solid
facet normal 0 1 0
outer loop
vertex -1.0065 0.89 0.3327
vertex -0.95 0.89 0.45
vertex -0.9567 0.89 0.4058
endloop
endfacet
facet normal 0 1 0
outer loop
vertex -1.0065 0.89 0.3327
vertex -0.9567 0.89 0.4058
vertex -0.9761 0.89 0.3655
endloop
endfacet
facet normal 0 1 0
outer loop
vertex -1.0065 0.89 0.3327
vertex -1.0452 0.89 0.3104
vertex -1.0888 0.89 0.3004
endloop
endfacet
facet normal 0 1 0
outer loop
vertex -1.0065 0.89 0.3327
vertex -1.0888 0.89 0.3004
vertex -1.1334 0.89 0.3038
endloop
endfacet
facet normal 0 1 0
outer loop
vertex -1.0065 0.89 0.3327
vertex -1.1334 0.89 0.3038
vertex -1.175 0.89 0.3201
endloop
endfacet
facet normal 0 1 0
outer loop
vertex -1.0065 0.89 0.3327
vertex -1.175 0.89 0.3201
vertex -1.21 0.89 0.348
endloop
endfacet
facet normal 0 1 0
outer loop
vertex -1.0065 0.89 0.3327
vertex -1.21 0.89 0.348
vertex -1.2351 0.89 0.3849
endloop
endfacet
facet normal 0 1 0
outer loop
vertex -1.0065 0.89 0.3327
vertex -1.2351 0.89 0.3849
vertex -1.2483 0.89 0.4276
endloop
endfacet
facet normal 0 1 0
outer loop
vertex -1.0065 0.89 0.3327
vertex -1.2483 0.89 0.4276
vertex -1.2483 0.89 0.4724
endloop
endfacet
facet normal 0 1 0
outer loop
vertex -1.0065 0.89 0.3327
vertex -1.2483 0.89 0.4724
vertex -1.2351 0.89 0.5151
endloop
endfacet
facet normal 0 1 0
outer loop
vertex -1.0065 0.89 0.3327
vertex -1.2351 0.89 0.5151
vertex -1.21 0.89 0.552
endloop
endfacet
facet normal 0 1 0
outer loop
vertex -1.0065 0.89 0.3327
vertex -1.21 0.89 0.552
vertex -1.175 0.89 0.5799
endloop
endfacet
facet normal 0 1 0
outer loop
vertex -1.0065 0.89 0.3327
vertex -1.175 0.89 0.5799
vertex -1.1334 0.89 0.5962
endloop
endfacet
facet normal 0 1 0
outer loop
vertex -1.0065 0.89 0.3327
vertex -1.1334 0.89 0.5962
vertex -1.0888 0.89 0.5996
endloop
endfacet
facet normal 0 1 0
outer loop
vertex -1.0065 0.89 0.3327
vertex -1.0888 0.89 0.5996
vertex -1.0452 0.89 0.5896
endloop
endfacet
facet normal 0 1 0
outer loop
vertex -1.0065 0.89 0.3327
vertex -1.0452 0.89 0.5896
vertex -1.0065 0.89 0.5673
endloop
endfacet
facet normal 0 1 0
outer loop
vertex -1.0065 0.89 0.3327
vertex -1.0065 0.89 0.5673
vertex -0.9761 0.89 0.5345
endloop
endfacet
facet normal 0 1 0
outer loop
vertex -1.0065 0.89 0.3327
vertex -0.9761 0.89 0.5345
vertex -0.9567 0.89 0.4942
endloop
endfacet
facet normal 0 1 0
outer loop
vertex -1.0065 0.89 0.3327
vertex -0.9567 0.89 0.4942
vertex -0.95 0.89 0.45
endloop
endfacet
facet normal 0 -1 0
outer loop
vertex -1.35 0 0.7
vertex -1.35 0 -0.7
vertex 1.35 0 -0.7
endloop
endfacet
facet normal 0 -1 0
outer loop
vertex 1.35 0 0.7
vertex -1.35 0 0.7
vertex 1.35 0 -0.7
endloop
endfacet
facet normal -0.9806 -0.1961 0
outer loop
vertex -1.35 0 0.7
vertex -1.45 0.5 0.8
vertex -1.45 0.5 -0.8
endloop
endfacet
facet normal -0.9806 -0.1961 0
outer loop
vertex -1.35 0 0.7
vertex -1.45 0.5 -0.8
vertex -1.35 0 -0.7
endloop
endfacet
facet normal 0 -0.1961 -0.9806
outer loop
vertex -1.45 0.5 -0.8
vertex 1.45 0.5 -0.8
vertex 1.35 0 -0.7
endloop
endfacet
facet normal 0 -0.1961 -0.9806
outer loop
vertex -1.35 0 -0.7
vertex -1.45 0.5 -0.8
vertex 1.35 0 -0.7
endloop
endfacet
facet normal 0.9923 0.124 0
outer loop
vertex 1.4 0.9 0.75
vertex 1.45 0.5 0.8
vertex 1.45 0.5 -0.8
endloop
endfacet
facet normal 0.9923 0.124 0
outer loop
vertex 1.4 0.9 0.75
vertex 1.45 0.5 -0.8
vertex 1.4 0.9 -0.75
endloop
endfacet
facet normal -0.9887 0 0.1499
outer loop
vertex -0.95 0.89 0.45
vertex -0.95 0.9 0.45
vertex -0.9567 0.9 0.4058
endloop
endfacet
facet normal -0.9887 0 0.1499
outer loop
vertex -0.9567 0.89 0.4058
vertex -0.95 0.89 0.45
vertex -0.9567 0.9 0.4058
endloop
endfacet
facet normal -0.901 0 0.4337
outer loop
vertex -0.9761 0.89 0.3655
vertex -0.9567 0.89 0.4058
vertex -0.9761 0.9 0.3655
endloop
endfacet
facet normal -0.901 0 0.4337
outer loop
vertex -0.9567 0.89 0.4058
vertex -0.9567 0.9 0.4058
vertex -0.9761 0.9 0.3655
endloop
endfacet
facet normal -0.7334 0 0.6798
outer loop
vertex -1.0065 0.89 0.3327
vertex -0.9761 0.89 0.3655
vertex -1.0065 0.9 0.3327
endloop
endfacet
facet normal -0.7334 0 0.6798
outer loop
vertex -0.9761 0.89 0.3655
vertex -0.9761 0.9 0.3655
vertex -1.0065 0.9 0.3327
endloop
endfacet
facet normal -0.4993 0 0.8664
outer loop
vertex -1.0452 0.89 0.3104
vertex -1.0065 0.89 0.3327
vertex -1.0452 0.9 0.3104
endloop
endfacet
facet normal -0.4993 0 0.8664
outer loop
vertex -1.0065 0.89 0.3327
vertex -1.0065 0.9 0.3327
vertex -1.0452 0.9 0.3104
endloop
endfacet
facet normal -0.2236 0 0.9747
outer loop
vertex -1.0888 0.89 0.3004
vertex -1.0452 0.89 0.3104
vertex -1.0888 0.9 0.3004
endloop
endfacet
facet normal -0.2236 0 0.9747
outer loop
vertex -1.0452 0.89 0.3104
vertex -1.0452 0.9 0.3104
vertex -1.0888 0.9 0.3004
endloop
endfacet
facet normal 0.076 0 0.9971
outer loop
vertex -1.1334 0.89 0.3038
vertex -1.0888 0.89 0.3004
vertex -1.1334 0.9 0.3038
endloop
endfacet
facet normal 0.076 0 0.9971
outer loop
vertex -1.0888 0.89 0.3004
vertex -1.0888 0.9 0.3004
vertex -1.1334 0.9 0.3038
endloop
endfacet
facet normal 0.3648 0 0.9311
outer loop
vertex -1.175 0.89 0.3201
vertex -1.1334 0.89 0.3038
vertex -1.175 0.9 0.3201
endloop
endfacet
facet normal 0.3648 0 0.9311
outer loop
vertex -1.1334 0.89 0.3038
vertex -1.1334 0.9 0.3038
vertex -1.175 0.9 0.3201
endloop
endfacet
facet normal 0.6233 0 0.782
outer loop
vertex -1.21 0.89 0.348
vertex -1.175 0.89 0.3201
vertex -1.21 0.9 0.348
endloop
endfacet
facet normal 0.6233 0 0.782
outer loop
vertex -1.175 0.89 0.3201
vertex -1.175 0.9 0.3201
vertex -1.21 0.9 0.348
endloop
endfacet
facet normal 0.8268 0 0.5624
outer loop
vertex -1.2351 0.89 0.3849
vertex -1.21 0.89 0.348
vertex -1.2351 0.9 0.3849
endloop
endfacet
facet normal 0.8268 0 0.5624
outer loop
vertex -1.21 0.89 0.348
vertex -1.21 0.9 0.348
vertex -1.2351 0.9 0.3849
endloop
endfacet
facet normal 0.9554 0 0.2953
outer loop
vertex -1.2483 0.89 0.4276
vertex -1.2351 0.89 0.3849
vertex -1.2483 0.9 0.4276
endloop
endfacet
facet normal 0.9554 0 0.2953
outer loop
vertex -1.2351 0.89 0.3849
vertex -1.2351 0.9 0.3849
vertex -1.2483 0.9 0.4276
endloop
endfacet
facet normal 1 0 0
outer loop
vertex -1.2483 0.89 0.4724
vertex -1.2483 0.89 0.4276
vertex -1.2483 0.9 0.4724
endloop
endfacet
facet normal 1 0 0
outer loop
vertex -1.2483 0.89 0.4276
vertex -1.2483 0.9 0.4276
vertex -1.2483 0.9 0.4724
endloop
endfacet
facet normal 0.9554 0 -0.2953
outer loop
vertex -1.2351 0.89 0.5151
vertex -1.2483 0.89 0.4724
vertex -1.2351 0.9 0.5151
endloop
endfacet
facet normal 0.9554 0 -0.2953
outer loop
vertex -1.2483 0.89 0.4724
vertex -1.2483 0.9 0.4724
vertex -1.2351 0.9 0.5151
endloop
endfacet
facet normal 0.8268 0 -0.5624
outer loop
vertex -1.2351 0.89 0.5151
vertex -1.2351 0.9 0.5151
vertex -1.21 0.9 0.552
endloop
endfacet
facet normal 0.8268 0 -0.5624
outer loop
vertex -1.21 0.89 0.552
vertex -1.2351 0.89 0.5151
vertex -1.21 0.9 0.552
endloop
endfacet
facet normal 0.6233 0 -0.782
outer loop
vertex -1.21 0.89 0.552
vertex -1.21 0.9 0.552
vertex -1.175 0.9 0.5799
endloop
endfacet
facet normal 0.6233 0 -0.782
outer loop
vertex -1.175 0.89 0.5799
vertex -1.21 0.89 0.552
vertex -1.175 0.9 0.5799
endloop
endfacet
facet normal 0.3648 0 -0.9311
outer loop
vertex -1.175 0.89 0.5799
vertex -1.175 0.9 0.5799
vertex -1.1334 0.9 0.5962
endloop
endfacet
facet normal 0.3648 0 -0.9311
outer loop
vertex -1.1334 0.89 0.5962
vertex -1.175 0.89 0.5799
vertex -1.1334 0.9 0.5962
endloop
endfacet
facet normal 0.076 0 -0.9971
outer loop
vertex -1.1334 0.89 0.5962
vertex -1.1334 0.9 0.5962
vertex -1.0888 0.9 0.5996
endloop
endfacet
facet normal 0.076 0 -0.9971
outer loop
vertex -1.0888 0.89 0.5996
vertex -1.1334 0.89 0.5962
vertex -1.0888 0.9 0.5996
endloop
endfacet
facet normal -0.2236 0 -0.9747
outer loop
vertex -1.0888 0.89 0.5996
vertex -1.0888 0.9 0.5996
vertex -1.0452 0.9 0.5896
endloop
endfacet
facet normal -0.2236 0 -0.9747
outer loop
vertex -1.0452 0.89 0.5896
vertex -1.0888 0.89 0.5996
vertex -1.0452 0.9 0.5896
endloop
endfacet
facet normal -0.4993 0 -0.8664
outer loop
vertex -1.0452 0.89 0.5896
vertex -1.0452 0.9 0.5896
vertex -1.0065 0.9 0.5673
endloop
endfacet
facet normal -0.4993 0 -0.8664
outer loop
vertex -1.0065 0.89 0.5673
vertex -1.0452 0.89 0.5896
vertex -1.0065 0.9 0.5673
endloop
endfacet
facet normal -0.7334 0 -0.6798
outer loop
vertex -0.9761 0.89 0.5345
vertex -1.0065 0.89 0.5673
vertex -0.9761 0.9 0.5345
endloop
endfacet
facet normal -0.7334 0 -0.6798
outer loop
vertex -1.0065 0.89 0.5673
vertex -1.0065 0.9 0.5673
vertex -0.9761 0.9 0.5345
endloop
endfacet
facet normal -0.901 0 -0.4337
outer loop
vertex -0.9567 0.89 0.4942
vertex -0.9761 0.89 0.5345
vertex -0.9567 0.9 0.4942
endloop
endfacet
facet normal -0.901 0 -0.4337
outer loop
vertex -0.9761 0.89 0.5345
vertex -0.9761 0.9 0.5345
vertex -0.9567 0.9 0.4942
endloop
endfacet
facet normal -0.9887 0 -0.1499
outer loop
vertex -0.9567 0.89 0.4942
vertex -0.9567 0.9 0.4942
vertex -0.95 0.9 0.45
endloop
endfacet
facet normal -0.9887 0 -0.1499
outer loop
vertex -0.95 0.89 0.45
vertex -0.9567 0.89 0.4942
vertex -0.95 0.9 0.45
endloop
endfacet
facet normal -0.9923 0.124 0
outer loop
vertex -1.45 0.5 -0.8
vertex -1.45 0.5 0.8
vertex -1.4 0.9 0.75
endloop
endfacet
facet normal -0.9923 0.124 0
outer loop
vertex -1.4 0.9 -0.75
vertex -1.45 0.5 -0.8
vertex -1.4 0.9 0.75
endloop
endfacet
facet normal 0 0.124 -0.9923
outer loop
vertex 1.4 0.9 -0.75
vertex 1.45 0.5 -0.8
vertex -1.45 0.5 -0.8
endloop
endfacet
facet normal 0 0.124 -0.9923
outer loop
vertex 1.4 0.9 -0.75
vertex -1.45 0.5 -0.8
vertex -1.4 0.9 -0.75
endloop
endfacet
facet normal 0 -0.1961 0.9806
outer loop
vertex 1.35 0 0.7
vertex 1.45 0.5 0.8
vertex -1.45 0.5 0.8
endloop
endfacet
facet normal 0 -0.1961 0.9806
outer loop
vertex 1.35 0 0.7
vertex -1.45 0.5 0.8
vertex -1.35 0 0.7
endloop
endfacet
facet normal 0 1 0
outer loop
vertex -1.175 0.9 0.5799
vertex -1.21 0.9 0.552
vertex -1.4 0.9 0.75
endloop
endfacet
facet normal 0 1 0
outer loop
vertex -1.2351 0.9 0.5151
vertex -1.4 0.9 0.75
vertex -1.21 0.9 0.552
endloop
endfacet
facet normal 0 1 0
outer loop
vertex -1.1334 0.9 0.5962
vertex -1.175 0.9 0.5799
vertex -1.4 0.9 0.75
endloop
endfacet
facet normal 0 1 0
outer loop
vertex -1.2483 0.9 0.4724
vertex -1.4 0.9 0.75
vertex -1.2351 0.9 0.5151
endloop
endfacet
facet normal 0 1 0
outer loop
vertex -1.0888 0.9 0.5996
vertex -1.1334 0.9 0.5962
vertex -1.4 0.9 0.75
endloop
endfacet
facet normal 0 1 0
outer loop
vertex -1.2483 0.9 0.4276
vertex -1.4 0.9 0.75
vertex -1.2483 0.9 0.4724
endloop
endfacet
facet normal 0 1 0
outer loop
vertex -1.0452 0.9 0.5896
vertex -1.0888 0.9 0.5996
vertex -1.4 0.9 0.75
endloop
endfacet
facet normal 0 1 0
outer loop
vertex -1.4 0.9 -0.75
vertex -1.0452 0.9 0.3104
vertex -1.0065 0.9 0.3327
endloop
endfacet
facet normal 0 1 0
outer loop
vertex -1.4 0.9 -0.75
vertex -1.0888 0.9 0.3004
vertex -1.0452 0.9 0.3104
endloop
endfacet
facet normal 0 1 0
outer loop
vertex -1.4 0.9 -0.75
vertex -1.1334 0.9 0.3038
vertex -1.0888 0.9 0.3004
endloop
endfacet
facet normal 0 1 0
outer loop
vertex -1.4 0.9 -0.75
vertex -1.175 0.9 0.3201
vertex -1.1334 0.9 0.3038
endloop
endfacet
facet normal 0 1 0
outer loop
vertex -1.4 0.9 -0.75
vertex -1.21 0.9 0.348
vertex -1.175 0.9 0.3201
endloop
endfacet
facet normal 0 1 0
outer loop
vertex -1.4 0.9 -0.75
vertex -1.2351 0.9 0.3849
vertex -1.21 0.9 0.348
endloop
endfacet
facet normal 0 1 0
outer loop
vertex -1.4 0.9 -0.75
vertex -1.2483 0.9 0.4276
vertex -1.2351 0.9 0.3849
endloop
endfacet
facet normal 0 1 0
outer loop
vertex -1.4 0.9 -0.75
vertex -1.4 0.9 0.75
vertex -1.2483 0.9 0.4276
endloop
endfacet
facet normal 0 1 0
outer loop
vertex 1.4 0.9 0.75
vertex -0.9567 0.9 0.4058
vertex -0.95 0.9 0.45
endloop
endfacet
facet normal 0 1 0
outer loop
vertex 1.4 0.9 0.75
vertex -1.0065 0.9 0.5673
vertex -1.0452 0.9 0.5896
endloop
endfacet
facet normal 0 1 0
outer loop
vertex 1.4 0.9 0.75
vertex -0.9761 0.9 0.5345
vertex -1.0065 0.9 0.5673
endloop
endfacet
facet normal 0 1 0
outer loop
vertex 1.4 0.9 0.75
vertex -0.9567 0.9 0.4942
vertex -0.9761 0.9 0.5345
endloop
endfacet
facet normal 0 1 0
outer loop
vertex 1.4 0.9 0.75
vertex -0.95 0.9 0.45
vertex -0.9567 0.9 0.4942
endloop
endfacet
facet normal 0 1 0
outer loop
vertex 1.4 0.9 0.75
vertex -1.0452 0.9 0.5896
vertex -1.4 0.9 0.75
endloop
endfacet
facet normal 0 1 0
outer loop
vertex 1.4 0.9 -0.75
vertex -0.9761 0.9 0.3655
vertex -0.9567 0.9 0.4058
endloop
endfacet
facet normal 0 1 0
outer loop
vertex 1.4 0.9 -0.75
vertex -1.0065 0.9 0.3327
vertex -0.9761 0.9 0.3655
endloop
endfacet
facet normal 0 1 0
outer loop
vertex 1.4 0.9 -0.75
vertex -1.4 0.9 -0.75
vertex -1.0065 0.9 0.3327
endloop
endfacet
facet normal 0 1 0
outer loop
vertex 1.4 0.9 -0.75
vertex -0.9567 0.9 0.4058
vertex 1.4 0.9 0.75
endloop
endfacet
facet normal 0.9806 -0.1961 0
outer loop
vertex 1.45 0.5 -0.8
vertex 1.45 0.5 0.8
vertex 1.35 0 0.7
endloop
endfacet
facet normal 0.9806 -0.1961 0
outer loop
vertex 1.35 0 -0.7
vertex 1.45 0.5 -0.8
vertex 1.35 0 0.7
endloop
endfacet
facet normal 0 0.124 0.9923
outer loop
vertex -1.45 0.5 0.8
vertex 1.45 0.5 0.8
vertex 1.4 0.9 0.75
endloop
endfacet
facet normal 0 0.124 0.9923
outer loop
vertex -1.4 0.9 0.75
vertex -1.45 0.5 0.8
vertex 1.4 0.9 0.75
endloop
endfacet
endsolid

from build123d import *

# Parameters (mm, degrees)
SKETCH1_W           = 2.9
SKETCH1_H           = 1.6
BOSS_EXTRUDE1_DEPTH = 0.9
CUT_EXTRUDE1_DEPTH  = 2.45
CUT_EXTRUDE2_DEPTH  = 2.45
CUT_EXTRUDE3_DEPTH  = 1.8
CUT_EXTRUDE4_DEPTH  = 1.8
SKETCH6_R           = 0.15
CUT_EXTRUDE5_DEPTH  = 0.01


with BuildPart() as part:
    # Sketch1 → Boss-Extrude1 (new body)
    with BuildSketch(Plane(origin=(0, 0, 0), x_dir=(1, 0, 0), z_dir=(0, 1, 0))):
        Rectangle(SKETCH1_W, SKETCH1_H)
    extrude(amount=BOSS_EXTRUDE1_DEPTH)

    # Sketch2 → Cut-Extrude1 (cut, symmetric)
    with BuildSketch(Plane(origin=(0, 0, 0), x_dir=(0, 0, -1), z_dir=(1, 0, 0))):
        Polygon((-0.8, 0.5), (-0.7, 0), (-0.8, 0), align=None)
    cut_extrude1 = extrude(amount=CUT_EXTRUDE1_DEPTH, both=True, mode=Mode.SUBTRACT)

    # Mirror1: Cut-Extrude1 across plane
    add(cut_extrude1.mirror(Plane.XY), mode=Mode.SUBTRACT)

    # Sketch3 → Cut-Extrude2 (cut, symmetric)
    with BuildSketch(Plane(origin=(0, 0, 0), x_dir=(0, 0, -1), z_dir=(1, 0, 0))):
        Polygon((-0.8, 0.5), (-0.75, 0.9), (-0.8, 0.9), align=None)
    cut_extrude2 = extrude(amount=CUT_EXTRUDE2_DEPTH, both=True, mode=Mode.SUBTRACT)

    # Mirror2: Cut-Extrude2 across plane
    add(cut_extrude2.mirror(Plane.XY), mode=Mode.SUBTRACT)

    # Sketch4 → Cut-Extrude3 (cut, symmetric)
    with BuildSketch(Plane.XY):
        Polygon((-1.45, 0.5), (-1.35, 0), (-1.45, 0), align=None)
    cut_extrude3 = extrude(amount=CUT_EXTRUDE3_DEPTH, both=True, mode=Mode.SUBTRACT)

    # Mirror3: Cut-Extrude3 across plane
    add(cut_extrude3.mirror(Plane(origin=(0, 0, 0), x_dir=(0, 0, 1), z_dir=(1, 0, 0))), mode=Mode.SUBTRACT)

    # Sketch5 → Cut-Extrude4 (cut, symmetric)
    with BuildSketch(Plane.XY):
        Polygon((-1.45, 0.5), (-1.4, 0.9), (-1.45, 0.9), align=None)
    cut_extrude4 = extrude(amount=CUT_EXTRUDE4_DEPTH, both=True, mode=Mode.SUBTRACT)

    # Mirror4: Cut-Extrude4 across plane
    add(cut_extrude4.mirror(Plane(origin=(0, 0, 0), x_dir=(0, 0, 1), z_dir=(1, 0, 0))), mode=Mode.SUBTRACT)

    # Sketch6 → Cut-Extrude5 (cut)
    with BuildSketch(Plane(origin=(0, 0.9, 0), x_dir=(1, 0, 0), z_dir=(0, 1, 0))):
        with Locations((-1.1, -0.45)):
            Circle(SKETCH6_R)
    extrude(amount=-CUT_EXTRUDE5_DEPTH, mode=Mode.SUBTRACT)


solid = part.part
